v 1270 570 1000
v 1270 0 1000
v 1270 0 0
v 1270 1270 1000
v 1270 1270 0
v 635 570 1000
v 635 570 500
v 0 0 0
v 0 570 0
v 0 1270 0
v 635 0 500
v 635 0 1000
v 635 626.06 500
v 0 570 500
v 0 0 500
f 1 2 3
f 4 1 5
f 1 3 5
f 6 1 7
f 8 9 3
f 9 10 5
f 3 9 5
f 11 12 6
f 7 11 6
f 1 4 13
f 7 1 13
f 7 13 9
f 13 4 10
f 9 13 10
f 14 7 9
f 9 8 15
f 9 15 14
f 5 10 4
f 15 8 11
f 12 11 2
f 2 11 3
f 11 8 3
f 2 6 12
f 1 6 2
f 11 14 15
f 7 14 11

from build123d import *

# Parameters (mm, degrees)
F0_W     = 1270
F0_H     = 1270
F1_DEPTH = 1000
F2_W     = 635
F2_H     = 626.05989
F3_DEPTH = 500
F5_DEPTH = 700


with BuildPart() as f1:
    # F0 (on Top) → F1 (new body)
    with BuildSketch(Plane.XY):
        with Locations((635, 635)):
            Rectangle(F0_W, F0_H)
    extrude(amount=F1_DEPTH)

    # F2 (on face) → F3 (cut)
    with BuildSketch(Plane.XY.offset(1000)):
        with Locations((317.5, 313.029945)):
            Rectangle(F2_W, F2_H)
    extrude(amount=-F3_DEPTH, mode=Mode.SUBTRACT)

    # F4 (on face) → F5 (cut)
    with BuildSketch(Plane(origin=(0, 1270, 0), x_dir=(-1, 0, 0), z_dir=(0, 1, 0))):
        Polygon((0, 1000), (-1270, 1000), (0, 0), align=None)
    extrude(amount=-F5_DEPTH, mode=Mode.SUBTRACT)


solid = f1.part
